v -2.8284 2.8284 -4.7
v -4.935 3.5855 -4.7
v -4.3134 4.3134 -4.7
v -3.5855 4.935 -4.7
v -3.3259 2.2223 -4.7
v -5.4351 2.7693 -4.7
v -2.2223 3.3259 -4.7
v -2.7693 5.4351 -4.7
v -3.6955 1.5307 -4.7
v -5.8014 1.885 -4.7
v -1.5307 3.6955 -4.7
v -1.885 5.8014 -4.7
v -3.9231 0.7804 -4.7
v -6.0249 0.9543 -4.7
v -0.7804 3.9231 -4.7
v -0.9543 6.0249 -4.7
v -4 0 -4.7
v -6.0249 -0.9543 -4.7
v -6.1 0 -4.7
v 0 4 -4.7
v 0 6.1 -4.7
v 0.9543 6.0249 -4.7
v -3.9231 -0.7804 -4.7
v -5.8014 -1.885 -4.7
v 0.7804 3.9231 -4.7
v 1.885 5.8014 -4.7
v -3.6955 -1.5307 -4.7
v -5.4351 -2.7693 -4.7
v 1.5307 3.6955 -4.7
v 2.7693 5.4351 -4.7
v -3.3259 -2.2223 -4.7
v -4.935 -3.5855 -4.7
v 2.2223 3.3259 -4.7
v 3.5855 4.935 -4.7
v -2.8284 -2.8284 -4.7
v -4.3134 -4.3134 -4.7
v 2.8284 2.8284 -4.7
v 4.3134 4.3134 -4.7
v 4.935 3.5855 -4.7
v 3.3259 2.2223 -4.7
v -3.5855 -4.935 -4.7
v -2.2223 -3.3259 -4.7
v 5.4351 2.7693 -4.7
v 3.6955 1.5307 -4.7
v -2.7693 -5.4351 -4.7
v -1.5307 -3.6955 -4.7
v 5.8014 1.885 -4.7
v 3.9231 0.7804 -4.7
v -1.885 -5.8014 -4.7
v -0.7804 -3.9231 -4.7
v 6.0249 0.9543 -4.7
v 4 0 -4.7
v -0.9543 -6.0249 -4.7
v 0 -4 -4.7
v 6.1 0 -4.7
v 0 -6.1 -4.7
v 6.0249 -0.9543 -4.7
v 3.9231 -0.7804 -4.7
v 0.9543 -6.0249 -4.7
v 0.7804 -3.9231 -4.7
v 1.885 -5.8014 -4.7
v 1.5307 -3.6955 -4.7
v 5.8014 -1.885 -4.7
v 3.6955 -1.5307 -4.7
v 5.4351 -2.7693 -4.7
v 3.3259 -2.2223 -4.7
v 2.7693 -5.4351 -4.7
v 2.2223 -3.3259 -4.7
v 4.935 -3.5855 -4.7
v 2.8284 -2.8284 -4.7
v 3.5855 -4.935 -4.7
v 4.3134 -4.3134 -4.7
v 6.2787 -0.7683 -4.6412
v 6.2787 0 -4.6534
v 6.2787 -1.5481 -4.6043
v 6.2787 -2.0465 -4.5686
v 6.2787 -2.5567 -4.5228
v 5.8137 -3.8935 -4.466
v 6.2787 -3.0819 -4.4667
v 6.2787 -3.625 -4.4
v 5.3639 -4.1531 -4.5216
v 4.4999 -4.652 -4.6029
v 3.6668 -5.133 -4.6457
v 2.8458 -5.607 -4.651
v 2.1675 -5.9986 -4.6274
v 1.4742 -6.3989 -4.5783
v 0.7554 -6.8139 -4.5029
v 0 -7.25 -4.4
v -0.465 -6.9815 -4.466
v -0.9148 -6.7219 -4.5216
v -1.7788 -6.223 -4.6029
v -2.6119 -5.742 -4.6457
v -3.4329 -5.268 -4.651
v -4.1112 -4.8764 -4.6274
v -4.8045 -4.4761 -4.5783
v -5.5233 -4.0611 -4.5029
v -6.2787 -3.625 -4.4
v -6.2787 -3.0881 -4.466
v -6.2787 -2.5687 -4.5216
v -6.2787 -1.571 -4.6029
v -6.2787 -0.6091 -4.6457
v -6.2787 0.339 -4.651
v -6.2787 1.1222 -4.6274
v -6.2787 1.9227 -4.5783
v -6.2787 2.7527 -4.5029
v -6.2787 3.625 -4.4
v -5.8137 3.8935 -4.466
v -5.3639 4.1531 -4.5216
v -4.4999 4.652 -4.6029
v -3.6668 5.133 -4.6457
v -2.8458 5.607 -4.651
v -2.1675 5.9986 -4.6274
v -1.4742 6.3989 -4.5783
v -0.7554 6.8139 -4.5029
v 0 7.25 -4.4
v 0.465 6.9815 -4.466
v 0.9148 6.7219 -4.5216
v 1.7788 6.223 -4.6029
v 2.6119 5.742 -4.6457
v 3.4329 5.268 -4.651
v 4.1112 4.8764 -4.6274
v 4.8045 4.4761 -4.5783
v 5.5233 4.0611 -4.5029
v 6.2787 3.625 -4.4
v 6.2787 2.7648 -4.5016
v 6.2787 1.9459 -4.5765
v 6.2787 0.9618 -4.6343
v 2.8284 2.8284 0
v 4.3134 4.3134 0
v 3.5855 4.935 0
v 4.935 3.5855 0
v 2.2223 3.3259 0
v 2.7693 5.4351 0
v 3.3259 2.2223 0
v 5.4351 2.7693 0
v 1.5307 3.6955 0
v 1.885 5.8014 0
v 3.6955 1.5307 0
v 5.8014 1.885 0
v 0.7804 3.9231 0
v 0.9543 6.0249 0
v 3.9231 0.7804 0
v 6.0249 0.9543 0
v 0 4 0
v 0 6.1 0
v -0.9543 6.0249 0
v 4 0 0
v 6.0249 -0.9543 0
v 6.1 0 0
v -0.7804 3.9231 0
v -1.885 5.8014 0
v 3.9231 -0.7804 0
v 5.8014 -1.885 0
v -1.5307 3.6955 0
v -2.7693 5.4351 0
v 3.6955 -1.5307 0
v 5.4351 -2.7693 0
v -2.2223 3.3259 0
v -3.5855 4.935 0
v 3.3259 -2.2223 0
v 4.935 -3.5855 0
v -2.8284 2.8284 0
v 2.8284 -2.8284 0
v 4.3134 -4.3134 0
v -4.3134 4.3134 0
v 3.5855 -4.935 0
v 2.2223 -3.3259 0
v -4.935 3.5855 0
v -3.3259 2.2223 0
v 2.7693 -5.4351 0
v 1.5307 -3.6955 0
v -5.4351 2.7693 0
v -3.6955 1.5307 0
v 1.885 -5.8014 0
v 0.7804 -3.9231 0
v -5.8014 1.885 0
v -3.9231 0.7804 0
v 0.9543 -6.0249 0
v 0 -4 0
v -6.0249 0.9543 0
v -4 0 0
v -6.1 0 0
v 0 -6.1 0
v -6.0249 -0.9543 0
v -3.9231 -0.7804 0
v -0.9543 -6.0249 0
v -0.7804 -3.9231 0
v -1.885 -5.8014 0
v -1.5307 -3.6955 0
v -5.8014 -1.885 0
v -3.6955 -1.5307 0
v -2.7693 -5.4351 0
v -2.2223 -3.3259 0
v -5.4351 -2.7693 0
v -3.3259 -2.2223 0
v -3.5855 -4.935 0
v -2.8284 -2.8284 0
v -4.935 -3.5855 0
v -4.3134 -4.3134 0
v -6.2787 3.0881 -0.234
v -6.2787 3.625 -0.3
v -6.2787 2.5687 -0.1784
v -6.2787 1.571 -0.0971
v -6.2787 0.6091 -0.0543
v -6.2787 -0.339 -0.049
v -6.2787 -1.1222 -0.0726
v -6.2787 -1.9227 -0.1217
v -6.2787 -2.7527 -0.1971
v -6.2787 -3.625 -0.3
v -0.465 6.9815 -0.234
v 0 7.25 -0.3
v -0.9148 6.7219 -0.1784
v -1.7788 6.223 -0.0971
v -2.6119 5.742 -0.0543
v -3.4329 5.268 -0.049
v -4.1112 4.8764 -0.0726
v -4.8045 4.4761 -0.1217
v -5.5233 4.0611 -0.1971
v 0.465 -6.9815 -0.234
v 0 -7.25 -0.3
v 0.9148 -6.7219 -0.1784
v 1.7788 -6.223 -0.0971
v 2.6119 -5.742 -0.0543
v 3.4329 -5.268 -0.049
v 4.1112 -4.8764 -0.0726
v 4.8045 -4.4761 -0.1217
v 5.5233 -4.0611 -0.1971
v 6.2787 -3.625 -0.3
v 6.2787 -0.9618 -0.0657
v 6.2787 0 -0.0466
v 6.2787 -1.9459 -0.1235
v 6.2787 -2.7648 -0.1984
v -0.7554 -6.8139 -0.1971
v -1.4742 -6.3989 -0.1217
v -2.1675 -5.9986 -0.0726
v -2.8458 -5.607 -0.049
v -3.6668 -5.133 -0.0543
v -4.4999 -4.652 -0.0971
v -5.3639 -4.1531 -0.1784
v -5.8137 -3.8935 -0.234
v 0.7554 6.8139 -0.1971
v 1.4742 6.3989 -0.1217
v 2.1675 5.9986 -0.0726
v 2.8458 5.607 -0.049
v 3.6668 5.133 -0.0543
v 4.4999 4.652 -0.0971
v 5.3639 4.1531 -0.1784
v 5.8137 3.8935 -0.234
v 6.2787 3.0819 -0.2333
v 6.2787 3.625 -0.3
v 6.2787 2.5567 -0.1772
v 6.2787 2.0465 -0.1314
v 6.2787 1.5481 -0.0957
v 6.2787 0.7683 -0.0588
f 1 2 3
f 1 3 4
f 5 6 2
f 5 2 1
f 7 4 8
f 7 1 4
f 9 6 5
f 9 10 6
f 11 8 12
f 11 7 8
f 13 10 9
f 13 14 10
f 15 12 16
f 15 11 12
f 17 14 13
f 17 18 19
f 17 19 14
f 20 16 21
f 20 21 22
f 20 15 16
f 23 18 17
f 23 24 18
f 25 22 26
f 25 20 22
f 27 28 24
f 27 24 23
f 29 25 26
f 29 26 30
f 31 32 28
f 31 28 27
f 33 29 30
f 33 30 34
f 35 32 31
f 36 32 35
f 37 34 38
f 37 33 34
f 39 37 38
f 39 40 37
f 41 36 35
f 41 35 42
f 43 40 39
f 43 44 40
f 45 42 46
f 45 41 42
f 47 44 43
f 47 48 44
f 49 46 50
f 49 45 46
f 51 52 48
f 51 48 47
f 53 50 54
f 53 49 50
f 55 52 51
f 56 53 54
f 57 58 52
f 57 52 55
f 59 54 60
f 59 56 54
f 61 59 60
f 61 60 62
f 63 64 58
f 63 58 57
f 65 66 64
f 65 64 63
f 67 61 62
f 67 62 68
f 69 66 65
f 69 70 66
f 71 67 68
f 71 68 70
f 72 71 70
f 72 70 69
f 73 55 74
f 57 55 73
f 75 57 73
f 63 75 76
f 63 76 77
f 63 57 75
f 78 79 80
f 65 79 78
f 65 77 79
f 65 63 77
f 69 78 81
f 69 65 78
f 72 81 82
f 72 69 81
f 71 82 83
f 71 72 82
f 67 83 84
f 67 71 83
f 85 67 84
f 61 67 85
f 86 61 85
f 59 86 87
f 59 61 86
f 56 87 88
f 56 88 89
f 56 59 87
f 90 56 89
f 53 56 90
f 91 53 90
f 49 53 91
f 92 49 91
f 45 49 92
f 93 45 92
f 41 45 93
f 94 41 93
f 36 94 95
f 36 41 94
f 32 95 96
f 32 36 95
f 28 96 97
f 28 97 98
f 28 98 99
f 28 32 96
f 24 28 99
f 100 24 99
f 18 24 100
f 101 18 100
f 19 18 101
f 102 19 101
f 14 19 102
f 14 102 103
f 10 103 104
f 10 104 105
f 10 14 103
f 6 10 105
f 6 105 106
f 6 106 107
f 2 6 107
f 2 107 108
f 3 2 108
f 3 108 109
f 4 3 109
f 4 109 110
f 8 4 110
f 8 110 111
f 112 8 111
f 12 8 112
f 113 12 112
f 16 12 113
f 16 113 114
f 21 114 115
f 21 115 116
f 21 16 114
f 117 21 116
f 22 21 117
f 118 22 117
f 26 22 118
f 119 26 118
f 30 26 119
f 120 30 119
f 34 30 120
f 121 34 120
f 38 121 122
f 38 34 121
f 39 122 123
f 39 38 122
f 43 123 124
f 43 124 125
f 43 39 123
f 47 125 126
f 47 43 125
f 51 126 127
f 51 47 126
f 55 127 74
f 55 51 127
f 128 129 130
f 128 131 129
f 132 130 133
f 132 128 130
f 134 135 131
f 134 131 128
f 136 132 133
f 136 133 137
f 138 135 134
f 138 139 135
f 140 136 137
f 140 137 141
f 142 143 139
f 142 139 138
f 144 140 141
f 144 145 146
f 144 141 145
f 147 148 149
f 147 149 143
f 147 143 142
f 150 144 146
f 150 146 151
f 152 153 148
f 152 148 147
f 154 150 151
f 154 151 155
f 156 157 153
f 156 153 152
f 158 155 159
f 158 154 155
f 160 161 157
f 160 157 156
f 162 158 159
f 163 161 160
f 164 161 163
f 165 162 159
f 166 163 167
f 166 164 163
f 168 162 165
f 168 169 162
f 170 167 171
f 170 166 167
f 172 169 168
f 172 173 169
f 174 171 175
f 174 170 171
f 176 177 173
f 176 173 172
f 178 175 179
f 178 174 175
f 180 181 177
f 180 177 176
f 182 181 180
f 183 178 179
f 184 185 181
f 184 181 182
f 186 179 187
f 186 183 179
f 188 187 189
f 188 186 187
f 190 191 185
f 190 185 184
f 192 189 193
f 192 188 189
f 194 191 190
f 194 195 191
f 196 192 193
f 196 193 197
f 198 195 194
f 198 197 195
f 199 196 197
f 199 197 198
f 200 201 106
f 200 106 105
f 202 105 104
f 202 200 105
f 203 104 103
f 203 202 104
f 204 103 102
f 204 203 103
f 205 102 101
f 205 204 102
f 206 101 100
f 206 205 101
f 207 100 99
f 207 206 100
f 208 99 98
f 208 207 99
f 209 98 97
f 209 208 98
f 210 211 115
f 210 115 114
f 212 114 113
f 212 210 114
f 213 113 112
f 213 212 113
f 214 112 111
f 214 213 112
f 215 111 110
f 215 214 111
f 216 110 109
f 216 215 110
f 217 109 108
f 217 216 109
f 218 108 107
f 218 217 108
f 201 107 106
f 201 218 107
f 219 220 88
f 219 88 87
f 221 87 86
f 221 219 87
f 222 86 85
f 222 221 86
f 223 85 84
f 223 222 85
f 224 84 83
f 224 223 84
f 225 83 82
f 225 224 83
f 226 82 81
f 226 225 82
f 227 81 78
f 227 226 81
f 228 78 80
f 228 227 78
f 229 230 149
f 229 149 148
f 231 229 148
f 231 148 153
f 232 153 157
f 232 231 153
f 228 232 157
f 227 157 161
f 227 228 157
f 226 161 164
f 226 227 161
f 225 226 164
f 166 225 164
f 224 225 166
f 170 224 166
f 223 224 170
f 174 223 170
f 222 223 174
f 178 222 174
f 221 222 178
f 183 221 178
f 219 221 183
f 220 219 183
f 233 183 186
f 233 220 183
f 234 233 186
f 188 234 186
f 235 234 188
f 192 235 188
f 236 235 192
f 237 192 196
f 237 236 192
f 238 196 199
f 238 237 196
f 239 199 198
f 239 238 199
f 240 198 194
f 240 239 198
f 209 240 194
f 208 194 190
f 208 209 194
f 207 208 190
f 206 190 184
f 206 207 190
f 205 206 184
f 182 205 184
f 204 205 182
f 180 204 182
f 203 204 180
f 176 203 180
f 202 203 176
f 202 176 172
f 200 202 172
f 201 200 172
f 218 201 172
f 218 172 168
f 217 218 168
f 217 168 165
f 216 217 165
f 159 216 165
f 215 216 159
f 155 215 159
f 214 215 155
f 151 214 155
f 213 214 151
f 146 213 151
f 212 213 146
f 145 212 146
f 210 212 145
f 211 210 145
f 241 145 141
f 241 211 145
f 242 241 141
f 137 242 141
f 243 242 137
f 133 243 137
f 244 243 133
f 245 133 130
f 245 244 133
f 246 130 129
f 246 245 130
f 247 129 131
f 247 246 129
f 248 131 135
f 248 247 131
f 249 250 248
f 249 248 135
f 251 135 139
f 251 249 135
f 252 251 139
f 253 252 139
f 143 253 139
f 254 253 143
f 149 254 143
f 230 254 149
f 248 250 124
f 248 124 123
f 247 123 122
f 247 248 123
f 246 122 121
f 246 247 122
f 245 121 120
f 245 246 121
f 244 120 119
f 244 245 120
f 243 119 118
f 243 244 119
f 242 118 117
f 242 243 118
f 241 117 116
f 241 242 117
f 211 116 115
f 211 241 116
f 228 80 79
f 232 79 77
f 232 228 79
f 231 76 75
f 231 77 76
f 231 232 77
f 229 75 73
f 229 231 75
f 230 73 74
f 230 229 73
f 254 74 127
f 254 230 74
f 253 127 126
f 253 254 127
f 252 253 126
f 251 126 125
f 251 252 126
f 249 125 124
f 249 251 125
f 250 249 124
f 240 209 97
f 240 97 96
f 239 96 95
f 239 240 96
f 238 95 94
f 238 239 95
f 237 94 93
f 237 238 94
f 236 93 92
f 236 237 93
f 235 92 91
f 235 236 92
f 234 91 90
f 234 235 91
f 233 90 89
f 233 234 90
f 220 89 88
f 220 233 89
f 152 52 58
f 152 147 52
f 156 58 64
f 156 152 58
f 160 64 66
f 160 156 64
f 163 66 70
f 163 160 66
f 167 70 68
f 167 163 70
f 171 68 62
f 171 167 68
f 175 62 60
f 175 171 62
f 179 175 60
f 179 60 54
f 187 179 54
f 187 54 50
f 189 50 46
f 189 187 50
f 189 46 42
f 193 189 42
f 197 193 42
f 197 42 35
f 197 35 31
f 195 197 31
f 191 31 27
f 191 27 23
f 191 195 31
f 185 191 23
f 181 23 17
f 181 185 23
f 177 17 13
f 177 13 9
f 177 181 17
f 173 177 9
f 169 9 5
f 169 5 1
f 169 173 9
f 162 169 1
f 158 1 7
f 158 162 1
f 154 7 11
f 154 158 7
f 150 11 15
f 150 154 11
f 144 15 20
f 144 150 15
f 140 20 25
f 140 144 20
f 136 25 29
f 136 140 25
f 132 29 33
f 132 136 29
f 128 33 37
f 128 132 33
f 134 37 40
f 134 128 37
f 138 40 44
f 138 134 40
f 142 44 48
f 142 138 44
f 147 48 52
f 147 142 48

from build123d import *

# Parameters (mm, degrees)
SKETCH_3_OUTSIDE_W  = 20.708
SKETCH_3_OUTSIDE_H  = 20.708
CUT_EXTRUDE_2_DEPTH = 4.7


with BuildPart() as part:
    # Эскиз2 → Повернуть1 (revolve)
    with BuildSketch(Plane(origin=(0, 0, 0), x_dir=(0, 0, -1), z_dir=(1, 0, 0)), mode=Mode.PRIVATE) as revolve_1_sk:
        Polygon((0, 4), (0, 6.1), (0.3, 7.25), (4.4, 7.25), (4.7, 6.1), (4.7, 4), align=None)
    revolve(revolve_1_sk.sketch.rotate(Axis((0, 0, 0), (0, 0, -1)), 90), axis=Axis((0, 0, 0), (0, 0, -1)))

    # Эскиз3 outside → Вытянуть2 (cut)
    with BuildSketch(Plane.XY):
        Rectangle(SKETCH_3_OUTSIDE_W, SKETCH_3_OUTSIDE_H)
        Polygon((0, 7.25), (-6.278684177, 3.625), (-6.278684177, -3.625), (0, -7.25), (6.278684177, -3.625), (6.278684177, 3.625), align=None, mode=Mode.SUBTRACT)
    extrude(amount=-CUT_EXTRUDE_2_DEPTH, mode=Mode.SUBTRACT)


solid = part.part
